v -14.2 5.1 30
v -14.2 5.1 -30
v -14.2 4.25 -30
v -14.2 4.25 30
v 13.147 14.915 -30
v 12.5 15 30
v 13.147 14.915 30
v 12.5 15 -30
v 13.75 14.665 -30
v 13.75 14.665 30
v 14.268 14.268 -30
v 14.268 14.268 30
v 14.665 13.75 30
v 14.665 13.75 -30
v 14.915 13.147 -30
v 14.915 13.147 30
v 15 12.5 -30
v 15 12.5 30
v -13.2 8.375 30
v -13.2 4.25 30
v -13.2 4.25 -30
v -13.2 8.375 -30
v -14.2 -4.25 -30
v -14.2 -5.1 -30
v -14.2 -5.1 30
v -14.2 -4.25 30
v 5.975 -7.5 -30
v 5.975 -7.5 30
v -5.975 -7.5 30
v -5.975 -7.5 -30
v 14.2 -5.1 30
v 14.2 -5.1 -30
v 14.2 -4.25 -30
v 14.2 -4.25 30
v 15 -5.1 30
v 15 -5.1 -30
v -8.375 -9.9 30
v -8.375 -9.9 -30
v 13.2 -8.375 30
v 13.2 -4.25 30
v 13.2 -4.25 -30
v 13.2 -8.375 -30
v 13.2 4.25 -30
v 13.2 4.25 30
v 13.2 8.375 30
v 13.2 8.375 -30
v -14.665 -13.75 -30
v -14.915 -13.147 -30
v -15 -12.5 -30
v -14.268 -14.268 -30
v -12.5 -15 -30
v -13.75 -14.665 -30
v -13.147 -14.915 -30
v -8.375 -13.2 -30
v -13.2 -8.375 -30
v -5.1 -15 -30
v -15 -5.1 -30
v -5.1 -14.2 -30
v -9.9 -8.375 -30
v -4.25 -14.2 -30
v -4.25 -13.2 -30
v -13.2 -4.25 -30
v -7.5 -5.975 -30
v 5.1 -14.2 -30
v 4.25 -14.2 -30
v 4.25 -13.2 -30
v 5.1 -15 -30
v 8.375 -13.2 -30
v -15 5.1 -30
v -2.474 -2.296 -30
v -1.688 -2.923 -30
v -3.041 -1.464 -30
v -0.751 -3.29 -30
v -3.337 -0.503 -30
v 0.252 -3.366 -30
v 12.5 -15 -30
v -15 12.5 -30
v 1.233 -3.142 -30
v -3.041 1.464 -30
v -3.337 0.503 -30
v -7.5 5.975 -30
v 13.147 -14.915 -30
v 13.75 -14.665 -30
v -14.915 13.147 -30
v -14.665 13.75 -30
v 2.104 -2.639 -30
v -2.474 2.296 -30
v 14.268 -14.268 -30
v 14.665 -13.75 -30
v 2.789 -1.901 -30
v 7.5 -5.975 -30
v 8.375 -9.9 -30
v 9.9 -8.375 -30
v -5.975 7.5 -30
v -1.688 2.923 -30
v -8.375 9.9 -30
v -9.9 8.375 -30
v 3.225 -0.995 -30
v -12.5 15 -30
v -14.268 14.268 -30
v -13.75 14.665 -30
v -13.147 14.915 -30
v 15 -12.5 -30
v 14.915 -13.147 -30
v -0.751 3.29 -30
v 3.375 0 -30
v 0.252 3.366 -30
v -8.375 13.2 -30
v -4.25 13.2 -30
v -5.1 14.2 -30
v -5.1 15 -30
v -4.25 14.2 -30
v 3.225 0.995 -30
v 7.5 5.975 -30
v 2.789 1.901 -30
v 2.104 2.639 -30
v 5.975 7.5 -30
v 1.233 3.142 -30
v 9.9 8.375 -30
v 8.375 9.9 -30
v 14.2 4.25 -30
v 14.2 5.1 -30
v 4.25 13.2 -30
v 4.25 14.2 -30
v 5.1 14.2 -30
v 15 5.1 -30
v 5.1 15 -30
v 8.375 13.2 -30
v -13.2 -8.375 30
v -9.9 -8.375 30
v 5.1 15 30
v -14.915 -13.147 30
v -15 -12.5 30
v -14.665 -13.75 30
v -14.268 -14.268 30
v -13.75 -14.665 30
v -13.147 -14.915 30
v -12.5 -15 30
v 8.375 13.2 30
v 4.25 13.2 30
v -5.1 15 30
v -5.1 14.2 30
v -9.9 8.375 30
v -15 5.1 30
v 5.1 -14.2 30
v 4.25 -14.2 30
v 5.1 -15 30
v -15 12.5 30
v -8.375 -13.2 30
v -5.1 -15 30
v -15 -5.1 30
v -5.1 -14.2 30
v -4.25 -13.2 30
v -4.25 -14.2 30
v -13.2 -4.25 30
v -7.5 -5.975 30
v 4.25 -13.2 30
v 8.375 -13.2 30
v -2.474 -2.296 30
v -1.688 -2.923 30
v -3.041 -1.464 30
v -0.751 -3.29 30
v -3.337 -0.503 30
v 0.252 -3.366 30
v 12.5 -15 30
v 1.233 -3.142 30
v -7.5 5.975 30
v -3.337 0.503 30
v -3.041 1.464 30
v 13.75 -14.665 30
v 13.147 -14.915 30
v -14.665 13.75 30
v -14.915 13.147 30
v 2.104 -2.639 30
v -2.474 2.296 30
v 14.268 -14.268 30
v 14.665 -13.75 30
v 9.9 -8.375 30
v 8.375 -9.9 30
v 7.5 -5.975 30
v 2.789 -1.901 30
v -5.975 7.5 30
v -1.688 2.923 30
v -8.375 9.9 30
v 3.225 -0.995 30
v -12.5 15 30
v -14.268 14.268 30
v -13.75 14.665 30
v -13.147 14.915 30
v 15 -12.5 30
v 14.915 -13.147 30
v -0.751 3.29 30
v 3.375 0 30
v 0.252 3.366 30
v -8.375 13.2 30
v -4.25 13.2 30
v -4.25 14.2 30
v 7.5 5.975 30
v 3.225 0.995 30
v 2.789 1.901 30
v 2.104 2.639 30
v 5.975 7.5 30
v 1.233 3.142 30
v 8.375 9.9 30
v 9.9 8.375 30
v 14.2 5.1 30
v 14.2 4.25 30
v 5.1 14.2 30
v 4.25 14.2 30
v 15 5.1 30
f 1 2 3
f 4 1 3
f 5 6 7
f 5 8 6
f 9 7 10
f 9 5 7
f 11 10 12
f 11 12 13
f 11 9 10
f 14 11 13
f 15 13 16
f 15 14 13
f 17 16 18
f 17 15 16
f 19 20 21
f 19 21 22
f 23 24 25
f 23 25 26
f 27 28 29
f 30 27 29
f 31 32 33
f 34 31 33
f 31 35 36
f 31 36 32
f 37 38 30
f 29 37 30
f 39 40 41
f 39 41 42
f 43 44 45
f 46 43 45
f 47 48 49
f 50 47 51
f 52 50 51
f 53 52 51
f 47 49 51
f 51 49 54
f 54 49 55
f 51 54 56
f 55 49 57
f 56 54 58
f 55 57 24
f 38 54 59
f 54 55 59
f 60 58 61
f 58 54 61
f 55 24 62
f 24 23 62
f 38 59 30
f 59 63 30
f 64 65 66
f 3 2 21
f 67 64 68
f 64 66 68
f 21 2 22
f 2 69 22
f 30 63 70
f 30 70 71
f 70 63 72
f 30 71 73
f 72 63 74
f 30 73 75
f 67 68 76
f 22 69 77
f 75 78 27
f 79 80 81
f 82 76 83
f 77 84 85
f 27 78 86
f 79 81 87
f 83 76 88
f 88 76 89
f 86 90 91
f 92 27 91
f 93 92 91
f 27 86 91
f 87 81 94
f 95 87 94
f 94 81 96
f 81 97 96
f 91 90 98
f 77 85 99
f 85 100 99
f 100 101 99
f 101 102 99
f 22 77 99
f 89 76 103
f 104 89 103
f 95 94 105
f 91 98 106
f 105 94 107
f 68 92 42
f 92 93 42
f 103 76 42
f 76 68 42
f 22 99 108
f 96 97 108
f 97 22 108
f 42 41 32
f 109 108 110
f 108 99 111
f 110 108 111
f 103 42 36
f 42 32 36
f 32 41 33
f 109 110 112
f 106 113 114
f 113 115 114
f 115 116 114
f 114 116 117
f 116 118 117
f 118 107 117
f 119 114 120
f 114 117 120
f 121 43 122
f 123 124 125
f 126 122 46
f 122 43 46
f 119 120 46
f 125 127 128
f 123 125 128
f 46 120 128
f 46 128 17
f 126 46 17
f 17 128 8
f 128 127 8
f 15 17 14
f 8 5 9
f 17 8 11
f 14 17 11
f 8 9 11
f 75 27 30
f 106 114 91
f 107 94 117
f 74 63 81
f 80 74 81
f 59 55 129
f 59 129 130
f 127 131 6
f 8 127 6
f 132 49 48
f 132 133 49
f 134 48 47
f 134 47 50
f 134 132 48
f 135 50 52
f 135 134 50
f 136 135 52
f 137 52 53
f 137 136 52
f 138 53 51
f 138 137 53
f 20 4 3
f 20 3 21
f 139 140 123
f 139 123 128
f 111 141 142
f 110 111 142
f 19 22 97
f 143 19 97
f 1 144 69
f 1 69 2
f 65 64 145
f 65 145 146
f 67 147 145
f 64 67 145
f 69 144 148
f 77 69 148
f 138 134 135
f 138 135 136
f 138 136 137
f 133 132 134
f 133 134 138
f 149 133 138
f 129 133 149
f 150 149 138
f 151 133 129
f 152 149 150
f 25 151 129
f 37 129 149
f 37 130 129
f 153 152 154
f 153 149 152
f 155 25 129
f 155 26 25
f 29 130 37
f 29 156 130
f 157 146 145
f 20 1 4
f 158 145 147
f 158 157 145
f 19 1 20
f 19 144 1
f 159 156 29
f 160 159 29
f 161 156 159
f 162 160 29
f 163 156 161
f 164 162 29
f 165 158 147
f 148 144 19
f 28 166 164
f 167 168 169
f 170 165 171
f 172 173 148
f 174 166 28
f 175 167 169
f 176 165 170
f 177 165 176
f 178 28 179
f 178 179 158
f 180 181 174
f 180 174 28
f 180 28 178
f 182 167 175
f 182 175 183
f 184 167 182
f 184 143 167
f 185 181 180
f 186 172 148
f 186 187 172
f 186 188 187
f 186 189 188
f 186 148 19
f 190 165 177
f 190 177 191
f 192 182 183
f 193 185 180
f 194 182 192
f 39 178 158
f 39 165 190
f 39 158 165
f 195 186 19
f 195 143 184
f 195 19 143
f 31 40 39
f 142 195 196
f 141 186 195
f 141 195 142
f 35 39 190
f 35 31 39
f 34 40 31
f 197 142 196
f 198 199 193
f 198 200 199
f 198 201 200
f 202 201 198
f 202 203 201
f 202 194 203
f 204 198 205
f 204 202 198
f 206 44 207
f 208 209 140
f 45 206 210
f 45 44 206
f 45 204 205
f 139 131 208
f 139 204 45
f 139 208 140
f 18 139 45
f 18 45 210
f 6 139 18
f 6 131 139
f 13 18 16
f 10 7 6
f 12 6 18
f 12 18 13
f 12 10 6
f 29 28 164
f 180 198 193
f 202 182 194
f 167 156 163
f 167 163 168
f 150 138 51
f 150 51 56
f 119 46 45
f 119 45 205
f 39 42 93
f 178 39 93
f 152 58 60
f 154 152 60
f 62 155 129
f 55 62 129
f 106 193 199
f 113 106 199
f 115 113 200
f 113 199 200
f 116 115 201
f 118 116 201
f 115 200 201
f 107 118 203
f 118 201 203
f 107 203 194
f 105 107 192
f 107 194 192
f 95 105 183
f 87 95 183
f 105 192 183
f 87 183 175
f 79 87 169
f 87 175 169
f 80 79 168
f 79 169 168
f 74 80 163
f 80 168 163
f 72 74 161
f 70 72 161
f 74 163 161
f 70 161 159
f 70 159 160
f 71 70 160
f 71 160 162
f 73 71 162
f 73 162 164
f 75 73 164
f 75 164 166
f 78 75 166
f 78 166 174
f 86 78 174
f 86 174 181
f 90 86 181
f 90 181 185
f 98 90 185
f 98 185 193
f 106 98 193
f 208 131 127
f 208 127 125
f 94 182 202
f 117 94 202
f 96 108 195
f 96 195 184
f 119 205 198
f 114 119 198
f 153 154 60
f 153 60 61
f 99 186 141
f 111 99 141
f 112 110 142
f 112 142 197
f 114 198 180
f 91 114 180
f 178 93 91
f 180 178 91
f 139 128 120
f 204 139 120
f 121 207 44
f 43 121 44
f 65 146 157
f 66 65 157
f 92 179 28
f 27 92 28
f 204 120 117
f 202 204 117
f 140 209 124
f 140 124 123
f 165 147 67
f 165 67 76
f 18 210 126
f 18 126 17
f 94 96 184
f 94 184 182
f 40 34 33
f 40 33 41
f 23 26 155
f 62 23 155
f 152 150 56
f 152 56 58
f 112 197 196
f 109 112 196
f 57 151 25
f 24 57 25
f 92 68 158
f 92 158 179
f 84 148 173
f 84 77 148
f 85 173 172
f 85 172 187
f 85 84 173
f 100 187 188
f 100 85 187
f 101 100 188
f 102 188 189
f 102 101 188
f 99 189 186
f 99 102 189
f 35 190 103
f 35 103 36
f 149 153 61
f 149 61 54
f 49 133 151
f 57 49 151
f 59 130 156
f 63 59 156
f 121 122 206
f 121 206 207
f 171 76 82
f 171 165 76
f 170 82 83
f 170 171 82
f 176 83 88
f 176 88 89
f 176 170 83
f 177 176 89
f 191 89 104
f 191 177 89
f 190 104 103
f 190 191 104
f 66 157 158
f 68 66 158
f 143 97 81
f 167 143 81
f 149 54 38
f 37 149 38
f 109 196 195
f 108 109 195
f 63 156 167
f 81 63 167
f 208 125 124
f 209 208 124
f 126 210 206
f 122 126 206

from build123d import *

# Parameters (mm, degrees)
SKETCH1_W                = 30
SKETCH1_H                = 30
BOSS_EXTRUDE1_DEPTH      = 30
SKETCH2_R                = 3.375
CUT_EXTRUDE1_DEPTH       = 64.639610307
FILLET1_R                = 2.5
CUT_EXTRUDE2_DEPTH       = 64.639610307
CIRPATTERN1_COUNT        = 4
CIRPATTERN1_COPY_1_DEPTH = 64.639610307
CIRPATTERN1_COPY_2_DEPTH = 64.639610307
CIRPATTERN1_COPY_3_DEPTH = 64.639610307


with BuildPart() as part:
    # Sketch1 → Boss-Extrude1 (new, symmetric)
    with BuildSketch(Plane.XY):
        Rectangle(SKETCH1_W, SKETCH1_H)
    extrude(amount=BOSS_EXTRUDE1_DEPTH, both=True)

    # Sketch2 → Cut-Extrude1 (cut, through all)
    with BuildSketch(Plane.XY.offset(30)):
        Circle(SKETCH2_R)
    extrude(amount=-CUT_EXTRUDE1_DEPTH, mode=Mode.SUBTRACT)

    # Fillet1
    fillet1_edges = [part.edges().sort_by_distance(p)[0] for p in [
        (15, -15, 0),
        (-15, -15, 0),
        (-15, 15, 0),
        (15, 15, 0),
    ]]
    fillet(fillet1_edges, radius=FILLET1_R)

    # Sketch3 → Cut-Extrude2 (cut, through all)
    with BuildSketch(Plane.XY.offset(30)):
        Polygon((0, 15), (-5.1, 15), (-5.1, 14.2), (-4.25, 14.2), (-4.25, 13.2), (-8.375, 13.2), (-8.375, 9.9), (-5.975, 7.5), (0, 7.5), align=None)
    cut_extrude2 = extrude(amount=-CUT_EXTRUDE2_DEPTH, mode=Mode.SUBTRACT)

    # Mirror1: Cut-Extrude2 across plane
    add(cut_extrude2.mirror(Plane(origin=(0, 0, 0), x_dir=(0, 0, 1), z_dir=(1, 0, 0))), mode=Mode.SUBTRACT)

    # CirPattern1: Cut-Extrude2 ×4 about axis
    cirpattern1_axis = Axis((0, 0, 0), (0, 0, 1))
    for i in range(1, CIRPATTERN1_COUNT):
        add(cut_extrude2.rotate(cirpattern1_axis, i * 360 / CIRPATTERN1_COUNT), mode=Mode.SUBTRACT)

    # CirPattern1 copy 1 sketch → CirPattern1 copy 1 (cut, through all)
    with BuildSketch(Plane(origin=(0, 0, 30), x_dir=(0, -1, 0), z_dir=(0, 0, 1))):
        Polygon((0, -15), (-5.1, -15), (-5.1, -14.2), (-4.25, -14.2), (-4.25, -13.2), (-8.375, -13.2), (-8.375, -9.9), (-5.975, -7.5), (0, -7.5), align=None)
    extrude(amount=-CIRPATTERN1_COPY_1_DEPTH, mode=Mode.SUBTRACT)

    # CirPattern1 copy 2 sketch → CirPattern1 copy 2 (cut, through all)
    with BuildSketch(Plane.XY.offset(30)):
        Polygon((0, -15), (-5.1, -15), (-5.1, -14.2), (-4.25, -14.2), (-4.25, -13.2), (-8.375, -13.2), (-8.375, -9.9), (-5.975, -7.5), (0, -7.5), align=None)
    extrude(amount=-CIRPATTERN1_COPY_2_DEPTH, mode=Mode.SUBTRACT)

    # CirPattern1 copy 3 sketch → CirPattern1 copy 3 (cut, through all)
    with BuildSketch(Plane(origin=(0, 0, 30), x_dir=(0, 1, 0), z_dir=(0, 0, 1))):
        Polygon((0, -15), (-5.1, -15), (-5.1, -14.2), (-4.25, -14.2), (-4.25, -13.2), (-8.375, -13.2), (-8.375, -9.9), (-5.975, -7.5), (0, -7.5), align=None)
    extrude(amount=-CIRPATTERN1_COPY_3_DEPTH, mode=Mode.SUBTRACT)


solid = part.part
